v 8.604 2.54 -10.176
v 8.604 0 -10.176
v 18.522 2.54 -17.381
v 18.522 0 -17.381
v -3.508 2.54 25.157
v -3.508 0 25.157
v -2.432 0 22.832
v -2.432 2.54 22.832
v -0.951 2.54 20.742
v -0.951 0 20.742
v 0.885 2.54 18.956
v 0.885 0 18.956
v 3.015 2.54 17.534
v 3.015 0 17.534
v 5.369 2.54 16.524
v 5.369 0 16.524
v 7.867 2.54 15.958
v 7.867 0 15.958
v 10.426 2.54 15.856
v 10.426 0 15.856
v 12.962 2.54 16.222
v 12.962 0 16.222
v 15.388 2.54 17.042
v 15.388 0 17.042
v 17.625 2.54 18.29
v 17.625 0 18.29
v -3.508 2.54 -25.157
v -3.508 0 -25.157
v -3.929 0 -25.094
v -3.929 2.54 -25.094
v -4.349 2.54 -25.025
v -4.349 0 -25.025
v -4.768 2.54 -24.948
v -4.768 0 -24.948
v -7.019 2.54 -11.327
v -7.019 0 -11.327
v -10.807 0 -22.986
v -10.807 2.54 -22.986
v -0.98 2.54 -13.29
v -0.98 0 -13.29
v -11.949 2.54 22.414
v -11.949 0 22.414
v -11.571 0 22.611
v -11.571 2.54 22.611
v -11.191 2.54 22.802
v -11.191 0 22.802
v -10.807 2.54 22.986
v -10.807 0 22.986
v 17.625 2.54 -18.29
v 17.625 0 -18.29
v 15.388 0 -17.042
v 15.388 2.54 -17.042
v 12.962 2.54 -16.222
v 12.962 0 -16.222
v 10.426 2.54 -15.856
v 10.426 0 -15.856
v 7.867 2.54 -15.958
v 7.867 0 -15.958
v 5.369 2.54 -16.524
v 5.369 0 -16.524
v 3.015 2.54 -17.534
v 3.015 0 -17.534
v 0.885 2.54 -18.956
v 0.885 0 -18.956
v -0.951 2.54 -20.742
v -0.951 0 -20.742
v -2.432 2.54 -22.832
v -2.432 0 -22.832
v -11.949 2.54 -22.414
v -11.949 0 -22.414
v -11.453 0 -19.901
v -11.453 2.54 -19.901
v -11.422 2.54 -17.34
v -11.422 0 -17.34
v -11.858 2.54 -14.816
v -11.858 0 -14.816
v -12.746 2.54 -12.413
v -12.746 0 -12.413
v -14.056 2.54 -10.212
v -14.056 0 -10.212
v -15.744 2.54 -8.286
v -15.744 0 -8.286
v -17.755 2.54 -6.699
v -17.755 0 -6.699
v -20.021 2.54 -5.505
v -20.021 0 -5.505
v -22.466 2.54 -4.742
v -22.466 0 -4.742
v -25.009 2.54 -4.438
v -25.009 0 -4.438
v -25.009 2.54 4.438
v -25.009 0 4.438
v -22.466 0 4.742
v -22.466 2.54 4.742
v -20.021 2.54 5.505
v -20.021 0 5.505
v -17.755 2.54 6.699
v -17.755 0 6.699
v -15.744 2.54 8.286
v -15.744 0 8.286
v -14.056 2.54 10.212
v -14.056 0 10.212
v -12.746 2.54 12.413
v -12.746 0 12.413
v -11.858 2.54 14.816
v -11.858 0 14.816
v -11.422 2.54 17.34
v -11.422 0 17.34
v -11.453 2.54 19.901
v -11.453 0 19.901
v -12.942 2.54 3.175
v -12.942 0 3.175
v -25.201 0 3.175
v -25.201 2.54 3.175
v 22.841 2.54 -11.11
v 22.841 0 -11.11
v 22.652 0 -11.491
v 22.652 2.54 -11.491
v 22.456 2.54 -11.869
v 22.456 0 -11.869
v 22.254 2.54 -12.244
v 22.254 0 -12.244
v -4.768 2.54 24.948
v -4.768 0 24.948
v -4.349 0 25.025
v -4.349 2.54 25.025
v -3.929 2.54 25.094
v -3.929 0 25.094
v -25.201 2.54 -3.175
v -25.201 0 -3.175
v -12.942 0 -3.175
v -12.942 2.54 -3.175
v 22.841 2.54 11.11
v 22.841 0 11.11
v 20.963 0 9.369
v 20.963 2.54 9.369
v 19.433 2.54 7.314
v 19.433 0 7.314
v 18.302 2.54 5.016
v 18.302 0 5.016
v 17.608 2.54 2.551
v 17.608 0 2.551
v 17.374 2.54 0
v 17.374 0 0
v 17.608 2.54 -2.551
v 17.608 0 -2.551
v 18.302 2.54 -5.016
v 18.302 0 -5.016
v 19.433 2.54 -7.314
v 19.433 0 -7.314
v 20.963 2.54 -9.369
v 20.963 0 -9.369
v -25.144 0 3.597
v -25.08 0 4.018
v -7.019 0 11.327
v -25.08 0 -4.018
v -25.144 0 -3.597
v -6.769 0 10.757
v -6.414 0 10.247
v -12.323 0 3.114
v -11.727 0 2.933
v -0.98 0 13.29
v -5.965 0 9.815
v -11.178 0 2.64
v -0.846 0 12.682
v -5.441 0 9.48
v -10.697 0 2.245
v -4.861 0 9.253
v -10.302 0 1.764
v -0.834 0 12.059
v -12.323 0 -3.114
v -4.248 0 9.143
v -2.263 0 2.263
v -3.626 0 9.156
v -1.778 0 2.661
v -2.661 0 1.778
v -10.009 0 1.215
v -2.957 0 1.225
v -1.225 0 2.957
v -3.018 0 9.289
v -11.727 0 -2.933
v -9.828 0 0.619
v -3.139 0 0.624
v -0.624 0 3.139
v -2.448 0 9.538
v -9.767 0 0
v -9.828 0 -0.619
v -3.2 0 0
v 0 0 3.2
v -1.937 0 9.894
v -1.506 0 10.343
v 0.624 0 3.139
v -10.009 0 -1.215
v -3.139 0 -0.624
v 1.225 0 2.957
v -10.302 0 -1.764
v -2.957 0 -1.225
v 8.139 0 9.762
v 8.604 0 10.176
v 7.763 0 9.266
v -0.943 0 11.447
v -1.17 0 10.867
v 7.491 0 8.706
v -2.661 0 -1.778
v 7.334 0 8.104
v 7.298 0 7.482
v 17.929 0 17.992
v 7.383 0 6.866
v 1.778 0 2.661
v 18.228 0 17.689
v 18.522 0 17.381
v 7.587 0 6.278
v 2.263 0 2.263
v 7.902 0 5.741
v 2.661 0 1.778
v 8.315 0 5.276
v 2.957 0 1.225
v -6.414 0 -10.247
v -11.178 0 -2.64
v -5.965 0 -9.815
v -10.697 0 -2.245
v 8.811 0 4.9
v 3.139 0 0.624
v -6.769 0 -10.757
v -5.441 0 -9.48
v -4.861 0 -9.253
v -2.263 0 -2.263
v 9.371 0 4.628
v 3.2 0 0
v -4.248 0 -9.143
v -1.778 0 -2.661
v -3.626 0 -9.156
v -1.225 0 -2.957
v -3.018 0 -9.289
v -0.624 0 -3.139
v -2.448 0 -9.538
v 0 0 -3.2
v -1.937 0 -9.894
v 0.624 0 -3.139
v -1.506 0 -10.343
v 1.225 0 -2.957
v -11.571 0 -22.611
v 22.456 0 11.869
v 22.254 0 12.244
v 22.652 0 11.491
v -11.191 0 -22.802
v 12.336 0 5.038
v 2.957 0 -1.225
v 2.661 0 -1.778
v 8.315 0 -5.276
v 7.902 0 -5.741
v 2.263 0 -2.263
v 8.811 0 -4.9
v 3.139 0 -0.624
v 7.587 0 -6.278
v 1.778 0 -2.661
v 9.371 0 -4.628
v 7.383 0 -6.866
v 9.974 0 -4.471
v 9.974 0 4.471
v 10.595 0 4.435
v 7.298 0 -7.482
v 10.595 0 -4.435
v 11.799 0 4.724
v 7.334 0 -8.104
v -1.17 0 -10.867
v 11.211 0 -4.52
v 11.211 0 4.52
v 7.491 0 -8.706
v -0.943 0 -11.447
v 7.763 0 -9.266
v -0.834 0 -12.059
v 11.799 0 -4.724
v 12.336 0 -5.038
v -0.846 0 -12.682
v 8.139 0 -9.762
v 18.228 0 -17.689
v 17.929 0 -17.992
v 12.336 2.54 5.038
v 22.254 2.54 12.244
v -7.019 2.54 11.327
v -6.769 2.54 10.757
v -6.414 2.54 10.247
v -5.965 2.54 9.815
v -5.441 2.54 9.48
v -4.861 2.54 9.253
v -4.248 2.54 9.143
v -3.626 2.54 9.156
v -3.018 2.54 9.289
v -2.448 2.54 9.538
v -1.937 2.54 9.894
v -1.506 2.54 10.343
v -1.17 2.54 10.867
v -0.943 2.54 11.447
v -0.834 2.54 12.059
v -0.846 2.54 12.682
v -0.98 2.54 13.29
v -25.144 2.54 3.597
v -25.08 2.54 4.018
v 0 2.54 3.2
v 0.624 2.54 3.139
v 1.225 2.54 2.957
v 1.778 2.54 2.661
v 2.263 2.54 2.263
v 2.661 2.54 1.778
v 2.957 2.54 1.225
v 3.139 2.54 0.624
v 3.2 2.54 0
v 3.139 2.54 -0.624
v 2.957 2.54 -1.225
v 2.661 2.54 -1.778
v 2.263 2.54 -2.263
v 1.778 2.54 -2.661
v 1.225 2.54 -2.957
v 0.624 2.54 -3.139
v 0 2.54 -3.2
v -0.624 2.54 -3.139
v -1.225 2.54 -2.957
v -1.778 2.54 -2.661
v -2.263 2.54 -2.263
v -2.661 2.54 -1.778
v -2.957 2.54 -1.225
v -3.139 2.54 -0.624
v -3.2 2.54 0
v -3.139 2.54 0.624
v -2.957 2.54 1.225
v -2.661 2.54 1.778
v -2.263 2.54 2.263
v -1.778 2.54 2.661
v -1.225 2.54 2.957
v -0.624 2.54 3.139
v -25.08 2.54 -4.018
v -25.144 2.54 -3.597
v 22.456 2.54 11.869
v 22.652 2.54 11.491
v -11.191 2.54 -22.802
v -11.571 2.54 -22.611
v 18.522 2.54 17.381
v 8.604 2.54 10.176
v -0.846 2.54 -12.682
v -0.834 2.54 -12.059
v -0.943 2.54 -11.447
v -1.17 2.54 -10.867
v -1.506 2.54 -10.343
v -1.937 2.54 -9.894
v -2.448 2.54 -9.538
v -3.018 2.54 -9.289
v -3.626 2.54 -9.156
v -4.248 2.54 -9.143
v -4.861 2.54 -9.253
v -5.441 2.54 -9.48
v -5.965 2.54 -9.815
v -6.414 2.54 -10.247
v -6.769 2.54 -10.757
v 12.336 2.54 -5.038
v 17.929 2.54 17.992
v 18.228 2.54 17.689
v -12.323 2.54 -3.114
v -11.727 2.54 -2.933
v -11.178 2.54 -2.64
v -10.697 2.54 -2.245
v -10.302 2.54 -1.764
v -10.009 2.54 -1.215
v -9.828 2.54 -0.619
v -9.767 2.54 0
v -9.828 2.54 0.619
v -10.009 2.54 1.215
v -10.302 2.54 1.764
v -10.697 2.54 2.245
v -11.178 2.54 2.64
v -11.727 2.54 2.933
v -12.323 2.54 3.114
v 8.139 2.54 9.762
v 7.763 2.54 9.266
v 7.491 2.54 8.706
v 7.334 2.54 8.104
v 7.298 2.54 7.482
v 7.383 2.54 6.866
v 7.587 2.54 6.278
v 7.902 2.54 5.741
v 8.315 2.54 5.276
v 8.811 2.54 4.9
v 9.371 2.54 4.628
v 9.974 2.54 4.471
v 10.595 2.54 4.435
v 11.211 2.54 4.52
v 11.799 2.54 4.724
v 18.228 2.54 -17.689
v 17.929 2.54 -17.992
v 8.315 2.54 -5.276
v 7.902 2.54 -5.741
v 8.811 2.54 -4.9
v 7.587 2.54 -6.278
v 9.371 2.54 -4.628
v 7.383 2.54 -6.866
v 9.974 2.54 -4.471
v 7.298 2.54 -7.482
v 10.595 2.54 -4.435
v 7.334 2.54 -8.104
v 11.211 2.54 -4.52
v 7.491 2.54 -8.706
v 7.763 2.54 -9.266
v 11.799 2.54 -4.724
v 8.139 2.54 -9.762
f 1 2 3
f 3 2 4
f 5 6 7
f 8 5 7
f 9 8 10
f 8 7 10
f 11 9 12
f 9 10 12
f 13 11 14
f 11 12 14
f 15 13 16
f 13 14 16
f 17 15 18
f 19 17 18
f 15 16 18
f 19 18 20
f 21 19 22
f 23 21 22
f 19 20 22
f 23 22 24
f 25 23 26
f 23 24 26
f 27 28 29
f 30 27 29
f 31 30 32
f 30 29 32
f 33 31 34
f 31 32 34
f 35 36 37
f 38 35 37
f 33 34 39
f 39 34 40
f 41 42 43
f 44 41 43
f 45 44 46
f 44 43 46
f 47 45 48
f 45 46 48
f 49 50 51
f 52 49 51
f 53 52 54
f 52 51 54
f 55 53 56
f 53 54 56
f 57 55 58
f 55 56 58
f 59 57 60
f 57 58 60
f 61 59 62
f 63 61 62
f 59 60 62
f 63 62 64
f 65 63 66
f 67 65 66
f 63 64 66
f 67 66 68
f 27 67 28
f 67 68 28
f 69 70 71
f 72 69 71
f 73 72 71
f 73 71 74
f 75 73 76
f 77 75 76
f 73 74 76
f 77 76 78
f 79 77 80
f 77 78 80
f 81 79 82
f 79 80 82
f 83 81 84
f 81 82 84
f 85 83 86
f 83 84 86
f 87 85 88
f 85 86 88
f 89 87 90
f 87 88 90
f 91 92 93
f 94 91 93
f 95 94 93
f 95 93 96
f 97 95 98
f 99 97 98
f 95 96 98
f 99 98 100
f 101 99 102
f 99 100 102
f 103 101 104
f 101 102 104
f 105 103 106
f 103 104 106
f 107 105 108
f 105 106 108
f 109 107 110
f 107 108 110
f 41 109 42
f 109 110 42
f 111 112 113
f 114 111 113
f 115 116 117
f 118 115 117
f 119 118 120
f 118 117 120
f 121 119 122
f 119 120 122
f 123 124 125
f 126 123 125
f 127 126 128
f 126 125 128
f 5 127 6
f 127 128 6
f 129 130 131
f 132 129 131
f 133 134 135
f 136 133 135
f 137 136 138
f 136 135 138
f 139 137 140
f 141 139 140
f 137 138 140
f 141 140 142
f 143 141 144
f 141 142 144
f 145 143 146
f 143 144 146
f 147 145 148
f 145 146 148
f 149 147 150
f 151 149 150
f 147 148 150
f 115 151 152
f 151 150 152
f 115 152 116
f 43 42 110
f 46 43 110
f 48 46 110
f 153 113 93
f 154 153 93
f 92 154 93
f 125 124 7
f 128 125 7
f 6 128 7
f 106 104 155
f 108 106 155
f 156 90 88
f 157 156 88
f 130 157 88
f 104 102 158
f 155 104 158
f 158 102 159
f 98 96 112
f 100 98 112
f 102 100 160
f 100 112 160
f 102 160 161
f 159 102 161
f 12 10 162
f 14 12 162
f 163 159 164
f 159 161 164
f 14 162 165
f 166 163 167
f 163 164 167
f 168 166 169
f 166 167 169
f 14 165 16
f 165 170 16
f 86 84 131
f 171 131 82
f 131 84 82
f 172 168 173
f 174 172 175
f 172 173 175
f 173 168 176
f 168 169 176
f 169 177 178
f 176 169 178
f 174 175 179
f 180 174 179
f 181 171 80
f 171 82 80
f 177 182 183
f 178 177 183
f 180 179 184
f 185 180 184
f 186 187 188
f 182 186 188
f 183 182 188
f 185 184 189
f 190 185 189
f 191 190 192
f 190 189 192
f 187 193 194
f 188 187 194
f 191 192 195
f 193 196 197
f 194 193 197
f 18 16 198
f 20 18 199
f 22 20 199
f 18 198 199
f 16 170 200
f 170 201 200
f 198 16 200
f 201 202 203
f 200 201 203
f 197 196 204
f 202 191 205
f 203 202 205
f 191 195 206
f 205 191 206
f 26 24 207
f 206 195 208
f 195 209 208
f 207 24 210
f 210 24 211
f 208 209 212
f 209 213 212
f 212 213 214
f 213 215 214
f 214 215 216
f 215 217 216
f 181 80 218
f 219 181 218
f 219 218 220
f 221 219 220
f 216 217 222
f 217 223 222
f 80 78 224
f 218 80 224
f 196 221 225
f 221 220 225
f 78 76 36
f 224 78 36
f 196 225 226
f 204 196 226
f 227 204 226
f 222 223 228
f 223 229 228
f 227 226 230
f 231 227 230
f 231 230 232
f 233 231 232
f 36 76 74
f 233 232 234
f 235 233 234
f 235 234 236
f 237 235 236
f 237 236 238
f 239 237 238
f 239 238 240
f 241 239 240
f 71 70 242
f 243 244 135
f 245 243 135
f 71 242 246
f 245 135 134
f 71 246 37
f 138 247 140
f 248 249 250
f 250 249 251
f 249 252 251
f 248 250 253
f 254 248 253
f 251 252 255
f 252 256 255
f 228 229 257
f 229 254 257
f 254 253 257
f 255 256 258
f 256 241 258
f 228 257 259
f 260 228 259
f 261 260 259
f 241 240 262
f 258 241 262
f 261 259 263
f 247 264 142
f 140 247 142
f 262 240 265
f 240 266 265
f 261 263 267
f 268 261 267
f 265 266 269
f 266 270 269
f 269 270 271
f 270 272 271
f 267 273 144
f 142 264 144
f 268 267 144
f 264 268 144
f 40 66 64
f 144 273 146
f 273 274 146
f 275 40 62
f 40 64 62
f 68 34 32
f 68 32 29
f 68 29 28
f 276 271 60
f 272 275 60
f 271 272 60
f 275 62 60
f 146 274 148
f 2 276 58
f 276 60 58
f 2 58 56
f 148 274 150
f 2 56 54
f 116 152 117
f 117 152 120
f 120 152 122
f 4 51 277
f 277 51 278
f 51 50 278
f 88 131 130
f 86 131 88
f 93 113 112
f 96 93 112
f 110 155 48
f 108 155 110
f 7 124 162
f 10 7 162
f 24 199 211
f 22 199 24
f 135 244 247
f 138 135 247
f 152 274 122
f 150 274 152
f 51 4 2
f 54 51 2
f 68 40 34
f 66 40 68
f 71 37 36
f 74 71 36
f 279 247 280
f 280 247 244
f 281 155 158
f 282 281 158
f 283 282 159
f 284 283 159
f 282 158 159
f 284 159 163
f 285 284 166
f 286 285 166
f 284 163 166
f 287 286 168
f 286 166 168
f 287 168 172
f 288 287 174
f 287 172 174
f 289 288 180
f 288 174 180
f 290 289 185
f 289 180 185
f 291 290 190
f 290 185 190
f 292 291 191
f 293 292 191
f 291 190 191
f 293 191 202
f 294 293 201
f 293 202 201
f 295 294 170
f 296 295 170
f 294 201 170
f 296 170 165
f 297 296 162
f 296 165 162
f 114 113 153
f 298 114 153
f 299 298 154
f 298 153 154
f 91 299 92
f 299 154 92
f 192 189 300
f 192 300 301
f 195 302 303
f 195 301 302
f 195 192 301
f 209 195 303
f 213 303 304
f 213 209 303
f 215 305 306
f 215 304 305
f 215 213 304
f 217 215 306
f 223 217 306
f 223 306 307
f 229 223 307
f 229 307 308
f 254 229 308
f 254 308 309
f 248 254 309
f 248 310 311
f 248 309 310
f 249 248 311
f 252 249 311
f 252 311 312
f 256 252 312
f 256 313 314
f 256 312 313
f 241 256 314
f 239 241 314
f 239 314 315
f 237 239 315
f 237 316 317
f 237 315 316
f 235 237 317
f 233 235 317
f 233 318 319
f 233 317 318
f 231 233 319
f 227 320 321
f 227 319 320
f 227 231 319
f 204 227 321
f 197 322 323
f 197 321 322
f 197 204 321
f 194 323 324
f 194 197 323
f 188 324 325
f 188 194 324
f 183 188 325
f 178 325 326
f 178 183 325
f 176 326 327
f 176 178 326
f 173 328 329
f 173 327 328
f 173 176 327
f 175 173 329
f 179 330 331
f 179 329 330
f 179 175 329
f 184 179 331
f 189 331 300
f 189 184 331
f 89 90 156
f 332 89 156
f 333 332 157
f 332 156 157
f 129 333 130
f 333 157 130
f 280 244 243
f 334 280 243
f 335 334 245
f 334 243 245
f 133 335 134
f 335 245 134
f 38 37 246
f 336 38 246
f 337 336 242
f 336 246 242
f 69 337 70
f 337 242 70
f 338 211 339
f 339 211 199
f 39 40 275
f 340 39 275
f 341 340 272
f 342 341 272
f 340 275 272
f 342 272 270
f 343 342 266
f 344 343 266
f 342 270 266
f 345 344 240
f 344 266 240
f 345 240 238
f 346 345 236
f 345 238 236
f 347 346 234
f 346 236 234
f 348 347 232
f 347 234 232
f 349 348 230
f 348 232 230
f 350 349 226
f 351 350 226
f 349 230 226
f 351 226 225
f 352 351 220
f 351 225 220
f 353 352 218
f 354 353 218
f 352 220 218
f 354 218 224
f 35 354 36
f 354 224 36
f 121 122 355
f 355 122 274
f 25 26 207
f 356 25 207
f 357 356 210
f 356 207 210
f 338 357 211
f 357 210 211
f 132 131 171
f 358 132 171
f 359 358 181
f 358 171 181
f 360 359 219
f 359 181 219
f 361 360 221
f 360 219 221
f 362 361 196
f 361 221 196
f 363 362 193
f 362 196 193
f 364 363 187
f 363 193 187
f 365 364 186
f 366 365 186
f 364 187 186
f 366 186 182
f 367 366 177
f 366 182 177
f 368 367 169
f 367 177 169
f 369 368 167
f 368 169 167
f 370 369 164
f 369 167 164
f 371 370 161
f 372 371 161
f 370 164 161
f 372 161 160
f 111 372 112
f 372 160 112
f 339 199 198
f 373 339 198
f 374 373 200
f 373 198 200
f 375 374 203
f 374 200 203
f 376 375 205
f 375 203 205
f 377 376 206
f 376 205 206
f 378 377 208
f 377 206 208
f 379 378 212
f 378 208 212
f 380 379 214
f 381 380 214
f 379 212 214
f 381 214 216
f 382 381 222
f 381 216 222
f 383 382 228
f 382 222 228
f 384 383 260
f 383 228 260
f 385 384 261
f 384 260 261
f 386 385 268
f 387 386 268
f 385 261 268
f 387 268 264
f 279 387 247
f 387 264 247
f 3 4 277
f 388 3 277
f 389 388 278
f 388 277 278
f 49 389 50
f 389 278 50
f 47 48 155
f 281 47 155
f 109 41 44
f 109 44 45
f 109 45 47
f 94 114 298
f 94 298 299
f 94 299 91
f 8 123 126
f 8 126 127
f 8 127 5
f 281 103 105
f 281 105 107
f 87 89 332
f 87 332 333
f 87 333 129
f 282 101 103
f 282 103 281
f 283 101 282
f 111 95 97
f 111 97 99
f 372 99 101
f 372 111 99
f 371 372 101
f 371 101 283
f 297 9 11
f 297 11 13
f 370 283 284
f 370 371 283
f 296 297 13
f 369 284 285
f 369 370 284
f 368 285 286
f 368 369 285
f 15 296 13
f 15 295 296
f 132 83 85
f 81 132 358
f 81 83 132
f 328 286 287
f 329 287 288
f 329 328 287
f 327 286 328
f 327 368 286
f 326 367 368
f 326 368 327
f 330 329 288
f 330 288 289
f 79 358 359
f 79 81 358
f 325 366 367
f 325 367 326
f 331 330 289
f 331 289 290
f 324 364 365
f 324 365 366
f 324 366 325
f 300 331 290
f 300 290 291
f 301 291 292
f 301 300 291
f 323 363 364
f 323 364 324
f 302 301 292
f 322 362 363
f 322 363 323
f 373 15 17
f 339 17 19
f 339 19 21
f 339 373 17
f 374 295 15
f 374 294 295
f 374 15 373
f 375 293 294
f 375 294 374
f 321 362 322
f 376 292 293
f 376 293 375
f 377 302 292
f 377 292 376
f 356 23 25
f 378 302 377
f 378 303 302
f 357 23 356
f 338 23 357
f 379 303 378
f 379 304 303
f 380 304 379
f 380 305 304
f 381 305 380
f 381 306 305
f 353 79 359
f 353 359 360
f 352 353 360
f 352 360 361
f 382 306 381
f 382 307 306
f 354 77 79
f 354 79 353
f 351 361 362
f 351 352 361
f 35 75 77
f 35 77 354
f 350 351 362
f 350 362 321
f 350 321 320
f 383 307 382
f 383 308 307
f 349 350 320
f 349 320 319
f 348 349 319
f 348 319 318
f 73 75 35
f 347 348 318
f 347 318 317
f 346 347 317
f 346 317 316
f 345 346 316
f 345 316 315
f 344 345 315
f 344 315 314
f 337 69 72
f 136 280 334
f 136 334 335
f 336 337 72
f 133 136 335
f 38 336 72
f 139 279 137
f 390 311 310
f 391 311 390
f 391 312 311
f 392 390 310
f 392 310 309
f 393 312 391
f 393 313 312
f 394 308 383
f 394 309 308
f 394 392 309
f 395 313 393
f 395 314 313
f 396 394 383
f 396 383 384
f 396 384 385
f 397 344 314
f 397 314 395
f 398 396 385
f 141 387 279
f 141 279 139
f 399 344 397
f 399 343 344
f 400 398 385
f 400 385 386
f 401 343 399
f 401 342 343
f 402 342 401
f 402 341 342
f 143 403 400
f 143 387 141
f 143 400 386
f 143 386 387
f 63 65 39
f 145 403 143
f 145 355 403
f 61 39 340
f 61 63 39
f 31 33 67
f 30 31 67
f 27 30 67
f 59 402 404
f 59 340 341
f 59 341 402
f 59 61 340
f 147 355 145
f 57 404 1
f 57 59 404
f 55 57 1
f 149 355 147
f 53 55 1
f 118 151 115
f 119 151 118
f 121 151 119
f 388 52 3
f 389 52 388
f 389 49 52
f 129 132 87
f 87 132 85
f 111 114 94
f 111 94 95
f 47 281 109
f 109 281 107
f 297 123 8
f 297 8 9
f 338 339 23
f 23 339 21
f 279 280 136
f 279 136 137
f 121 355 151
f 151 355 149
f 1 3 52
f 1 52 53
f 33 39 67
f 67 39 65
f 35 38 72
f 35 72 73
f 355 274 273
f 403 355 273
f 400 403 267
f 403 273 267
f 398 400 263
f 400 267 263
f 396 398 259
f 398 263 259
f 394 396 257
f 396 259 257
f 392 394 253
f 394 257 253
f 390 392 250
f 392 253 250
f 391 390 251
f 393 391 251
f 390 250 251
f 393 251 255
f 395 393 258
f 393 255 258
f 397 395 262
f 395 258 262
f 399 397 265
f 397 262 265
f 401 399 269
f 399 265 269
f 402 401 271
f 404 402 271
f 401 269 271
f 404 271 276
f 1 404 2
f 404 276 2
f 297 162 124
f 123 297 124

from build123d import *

# Parameters (mm, degrees)
STOCK_PART1_1_DEPTH     = 2.54
CUT_EXTRUDE1_DEPTH      = 36.698530161
CUT_EXTRUDE1_DEPTH_BACK = 36.698530161
SKETCH1_R               = 3.2004


# Read off the part's stored shape, not the designer's step: Stock-Part1-1
with BuildPart() as part:
    # Stock-Part1-1 outline → Stock-Part1-1 (new body)
    with BuildSketch(Plane(origin=(0, 0, 0), x_dir=(1, 0, 0), z_dir=(0, 1, 0))):
        with BuildLine():
            ThreePointArc((-10.807074113, 22.986238255), (-11.381462581, 22.707318413), (-11.948658366, 22.414048346))
            ThreePointArc((-11.948658366, 22.414048346), (-14.055886871, 10.212199581), (-25.009365231, 4.437527549))
            ThreePointArc((-25.009365231, 4.437527549), (-25.113008503, 3.807466867), (-25.200781238, 3.175))
            Line((-25.200781238, 3.175), (-12.941946417, 3.175))
            ThreePointArc((-12.941946417, 3.175), (-9.766946417, 0), (-12.941946417, -3.175))
            Line((-12.941946417, -3.175), (-25.200781238, -3.175))
            ThreePointArc((-25.200781238, -3.175), (-25.113008503, -3.807466867), (-25.009365231, -4.437527549))
            ThreePointArc((-25.009365231, -4.437527549), (-14.055886871, -10.212199581), (-11.948658366, -22.414048346))
            ThreePointArc((-11.948658366, -22.414048346), (-11.381462581, -22.707318413), (-10.807074113, -22.986238255))
            Line((-10.807074113, -22.986238255), (-7.018885822, -11.327393516))
            ThreePointArc((-7.018885822, -11.327393516), (-3.018152425, -9.288918034), (-0.979676944, -13.289651431))
            Line((-0.979676944, -13.289651431), (-4.767865235, -24.948496169))
            ThreePointArc((-4.767865235, -24.948496169), (-4.139230233, -25.060462348), (-3.507979383, -25.156591197))
            ThreePointArc((-3.507979383, -25.156591197), (5.368871043, -16.523686022), (17.624688241, -18.290171252))
            ThreePointArc((17.624688241, -18.290171252), (18.078877786, -17.841361439), (18.521642117, -17.381276515))
            Line((18.521642117, -17.381276515), (8.604036416, -10.175714197))
            ThreePointArc((8.604036416, -10.175714197), (7.901625635, -5.740867064), (12.336472768, -5.038456283))
            Line((12.336472768, -5.038456283), (22.254078469, -12.244018601))
            ThreePointArc((22.254078469, -12.244018601), (22.554823532, -11.680750638), (22.84131474, -11.110100852))
            ThreePointArc((22.84131474, -11.110100852), (17.374031657, 0), (22.84131474, 11.110100852))
            ThreePointArc((22.84131474, 11.110100852), (22.554823532, 11.680750638), (22.254078469, 12.244018601))
            Line((22.254078469, 12.244018601), (12.336472768, 5.038456283))
            ThreePointArc((12.336472768, 5.038456283), (7.901625635, 5.740867064), (8.604036416, 10.175714197))
            Line((8.604036416, 10.175714197), (18.521642117, 17.381276515))
            ThreePointArc((18.521642117, 17.381276515), (18.078877786, 17.841361439), (17.624688241, 18.290171252))
            ThreePointArc((17.624688241, 18.290171252), (5.368871043, 16.523686022), (-3.507979383, 25.156591197))
            ThreePointArc((-3.507979383, 25.156591197), (-4.139230233, 25.060462348), (-4.767865235, 24.948496169))
            Line((-4.767865235, 24.948496169), (-0.979676944, 13.289651431))
            ThreePointArc((-0.979676944, 13.289651431), (-3.018152425, 9.288918034), (-7.018885822, 11.327393516))
            Line((-7.018885822, 11.327393516), (-10.807074113, 22.986238255))
        make_face()
    extrude(amount=STOCK_PART1_1_DEPTH)

    # Sketch1 → Cut-Extrude1 (cut, two sides: drawn at the far end of the back side and taken through both)
    with BuildSketch(Plane(origin=(0, 2.54, 0), x_dir=(1, 0, 0), z_dir=(0, 1, 0)).offset(-CUT_EXTRUDE1_DEPTH_BACK)):
        with Locations(Location((0, 0, 0), (0, 0, 270))):
            Circle(SKETCH1_R)
    extrude(amount=CUT_EXTRUDE1_DEPTH + CUT_EXTRUDE1_DEPTH_BACK, mode=Mode.SUBTRACT)


solid = part.part
